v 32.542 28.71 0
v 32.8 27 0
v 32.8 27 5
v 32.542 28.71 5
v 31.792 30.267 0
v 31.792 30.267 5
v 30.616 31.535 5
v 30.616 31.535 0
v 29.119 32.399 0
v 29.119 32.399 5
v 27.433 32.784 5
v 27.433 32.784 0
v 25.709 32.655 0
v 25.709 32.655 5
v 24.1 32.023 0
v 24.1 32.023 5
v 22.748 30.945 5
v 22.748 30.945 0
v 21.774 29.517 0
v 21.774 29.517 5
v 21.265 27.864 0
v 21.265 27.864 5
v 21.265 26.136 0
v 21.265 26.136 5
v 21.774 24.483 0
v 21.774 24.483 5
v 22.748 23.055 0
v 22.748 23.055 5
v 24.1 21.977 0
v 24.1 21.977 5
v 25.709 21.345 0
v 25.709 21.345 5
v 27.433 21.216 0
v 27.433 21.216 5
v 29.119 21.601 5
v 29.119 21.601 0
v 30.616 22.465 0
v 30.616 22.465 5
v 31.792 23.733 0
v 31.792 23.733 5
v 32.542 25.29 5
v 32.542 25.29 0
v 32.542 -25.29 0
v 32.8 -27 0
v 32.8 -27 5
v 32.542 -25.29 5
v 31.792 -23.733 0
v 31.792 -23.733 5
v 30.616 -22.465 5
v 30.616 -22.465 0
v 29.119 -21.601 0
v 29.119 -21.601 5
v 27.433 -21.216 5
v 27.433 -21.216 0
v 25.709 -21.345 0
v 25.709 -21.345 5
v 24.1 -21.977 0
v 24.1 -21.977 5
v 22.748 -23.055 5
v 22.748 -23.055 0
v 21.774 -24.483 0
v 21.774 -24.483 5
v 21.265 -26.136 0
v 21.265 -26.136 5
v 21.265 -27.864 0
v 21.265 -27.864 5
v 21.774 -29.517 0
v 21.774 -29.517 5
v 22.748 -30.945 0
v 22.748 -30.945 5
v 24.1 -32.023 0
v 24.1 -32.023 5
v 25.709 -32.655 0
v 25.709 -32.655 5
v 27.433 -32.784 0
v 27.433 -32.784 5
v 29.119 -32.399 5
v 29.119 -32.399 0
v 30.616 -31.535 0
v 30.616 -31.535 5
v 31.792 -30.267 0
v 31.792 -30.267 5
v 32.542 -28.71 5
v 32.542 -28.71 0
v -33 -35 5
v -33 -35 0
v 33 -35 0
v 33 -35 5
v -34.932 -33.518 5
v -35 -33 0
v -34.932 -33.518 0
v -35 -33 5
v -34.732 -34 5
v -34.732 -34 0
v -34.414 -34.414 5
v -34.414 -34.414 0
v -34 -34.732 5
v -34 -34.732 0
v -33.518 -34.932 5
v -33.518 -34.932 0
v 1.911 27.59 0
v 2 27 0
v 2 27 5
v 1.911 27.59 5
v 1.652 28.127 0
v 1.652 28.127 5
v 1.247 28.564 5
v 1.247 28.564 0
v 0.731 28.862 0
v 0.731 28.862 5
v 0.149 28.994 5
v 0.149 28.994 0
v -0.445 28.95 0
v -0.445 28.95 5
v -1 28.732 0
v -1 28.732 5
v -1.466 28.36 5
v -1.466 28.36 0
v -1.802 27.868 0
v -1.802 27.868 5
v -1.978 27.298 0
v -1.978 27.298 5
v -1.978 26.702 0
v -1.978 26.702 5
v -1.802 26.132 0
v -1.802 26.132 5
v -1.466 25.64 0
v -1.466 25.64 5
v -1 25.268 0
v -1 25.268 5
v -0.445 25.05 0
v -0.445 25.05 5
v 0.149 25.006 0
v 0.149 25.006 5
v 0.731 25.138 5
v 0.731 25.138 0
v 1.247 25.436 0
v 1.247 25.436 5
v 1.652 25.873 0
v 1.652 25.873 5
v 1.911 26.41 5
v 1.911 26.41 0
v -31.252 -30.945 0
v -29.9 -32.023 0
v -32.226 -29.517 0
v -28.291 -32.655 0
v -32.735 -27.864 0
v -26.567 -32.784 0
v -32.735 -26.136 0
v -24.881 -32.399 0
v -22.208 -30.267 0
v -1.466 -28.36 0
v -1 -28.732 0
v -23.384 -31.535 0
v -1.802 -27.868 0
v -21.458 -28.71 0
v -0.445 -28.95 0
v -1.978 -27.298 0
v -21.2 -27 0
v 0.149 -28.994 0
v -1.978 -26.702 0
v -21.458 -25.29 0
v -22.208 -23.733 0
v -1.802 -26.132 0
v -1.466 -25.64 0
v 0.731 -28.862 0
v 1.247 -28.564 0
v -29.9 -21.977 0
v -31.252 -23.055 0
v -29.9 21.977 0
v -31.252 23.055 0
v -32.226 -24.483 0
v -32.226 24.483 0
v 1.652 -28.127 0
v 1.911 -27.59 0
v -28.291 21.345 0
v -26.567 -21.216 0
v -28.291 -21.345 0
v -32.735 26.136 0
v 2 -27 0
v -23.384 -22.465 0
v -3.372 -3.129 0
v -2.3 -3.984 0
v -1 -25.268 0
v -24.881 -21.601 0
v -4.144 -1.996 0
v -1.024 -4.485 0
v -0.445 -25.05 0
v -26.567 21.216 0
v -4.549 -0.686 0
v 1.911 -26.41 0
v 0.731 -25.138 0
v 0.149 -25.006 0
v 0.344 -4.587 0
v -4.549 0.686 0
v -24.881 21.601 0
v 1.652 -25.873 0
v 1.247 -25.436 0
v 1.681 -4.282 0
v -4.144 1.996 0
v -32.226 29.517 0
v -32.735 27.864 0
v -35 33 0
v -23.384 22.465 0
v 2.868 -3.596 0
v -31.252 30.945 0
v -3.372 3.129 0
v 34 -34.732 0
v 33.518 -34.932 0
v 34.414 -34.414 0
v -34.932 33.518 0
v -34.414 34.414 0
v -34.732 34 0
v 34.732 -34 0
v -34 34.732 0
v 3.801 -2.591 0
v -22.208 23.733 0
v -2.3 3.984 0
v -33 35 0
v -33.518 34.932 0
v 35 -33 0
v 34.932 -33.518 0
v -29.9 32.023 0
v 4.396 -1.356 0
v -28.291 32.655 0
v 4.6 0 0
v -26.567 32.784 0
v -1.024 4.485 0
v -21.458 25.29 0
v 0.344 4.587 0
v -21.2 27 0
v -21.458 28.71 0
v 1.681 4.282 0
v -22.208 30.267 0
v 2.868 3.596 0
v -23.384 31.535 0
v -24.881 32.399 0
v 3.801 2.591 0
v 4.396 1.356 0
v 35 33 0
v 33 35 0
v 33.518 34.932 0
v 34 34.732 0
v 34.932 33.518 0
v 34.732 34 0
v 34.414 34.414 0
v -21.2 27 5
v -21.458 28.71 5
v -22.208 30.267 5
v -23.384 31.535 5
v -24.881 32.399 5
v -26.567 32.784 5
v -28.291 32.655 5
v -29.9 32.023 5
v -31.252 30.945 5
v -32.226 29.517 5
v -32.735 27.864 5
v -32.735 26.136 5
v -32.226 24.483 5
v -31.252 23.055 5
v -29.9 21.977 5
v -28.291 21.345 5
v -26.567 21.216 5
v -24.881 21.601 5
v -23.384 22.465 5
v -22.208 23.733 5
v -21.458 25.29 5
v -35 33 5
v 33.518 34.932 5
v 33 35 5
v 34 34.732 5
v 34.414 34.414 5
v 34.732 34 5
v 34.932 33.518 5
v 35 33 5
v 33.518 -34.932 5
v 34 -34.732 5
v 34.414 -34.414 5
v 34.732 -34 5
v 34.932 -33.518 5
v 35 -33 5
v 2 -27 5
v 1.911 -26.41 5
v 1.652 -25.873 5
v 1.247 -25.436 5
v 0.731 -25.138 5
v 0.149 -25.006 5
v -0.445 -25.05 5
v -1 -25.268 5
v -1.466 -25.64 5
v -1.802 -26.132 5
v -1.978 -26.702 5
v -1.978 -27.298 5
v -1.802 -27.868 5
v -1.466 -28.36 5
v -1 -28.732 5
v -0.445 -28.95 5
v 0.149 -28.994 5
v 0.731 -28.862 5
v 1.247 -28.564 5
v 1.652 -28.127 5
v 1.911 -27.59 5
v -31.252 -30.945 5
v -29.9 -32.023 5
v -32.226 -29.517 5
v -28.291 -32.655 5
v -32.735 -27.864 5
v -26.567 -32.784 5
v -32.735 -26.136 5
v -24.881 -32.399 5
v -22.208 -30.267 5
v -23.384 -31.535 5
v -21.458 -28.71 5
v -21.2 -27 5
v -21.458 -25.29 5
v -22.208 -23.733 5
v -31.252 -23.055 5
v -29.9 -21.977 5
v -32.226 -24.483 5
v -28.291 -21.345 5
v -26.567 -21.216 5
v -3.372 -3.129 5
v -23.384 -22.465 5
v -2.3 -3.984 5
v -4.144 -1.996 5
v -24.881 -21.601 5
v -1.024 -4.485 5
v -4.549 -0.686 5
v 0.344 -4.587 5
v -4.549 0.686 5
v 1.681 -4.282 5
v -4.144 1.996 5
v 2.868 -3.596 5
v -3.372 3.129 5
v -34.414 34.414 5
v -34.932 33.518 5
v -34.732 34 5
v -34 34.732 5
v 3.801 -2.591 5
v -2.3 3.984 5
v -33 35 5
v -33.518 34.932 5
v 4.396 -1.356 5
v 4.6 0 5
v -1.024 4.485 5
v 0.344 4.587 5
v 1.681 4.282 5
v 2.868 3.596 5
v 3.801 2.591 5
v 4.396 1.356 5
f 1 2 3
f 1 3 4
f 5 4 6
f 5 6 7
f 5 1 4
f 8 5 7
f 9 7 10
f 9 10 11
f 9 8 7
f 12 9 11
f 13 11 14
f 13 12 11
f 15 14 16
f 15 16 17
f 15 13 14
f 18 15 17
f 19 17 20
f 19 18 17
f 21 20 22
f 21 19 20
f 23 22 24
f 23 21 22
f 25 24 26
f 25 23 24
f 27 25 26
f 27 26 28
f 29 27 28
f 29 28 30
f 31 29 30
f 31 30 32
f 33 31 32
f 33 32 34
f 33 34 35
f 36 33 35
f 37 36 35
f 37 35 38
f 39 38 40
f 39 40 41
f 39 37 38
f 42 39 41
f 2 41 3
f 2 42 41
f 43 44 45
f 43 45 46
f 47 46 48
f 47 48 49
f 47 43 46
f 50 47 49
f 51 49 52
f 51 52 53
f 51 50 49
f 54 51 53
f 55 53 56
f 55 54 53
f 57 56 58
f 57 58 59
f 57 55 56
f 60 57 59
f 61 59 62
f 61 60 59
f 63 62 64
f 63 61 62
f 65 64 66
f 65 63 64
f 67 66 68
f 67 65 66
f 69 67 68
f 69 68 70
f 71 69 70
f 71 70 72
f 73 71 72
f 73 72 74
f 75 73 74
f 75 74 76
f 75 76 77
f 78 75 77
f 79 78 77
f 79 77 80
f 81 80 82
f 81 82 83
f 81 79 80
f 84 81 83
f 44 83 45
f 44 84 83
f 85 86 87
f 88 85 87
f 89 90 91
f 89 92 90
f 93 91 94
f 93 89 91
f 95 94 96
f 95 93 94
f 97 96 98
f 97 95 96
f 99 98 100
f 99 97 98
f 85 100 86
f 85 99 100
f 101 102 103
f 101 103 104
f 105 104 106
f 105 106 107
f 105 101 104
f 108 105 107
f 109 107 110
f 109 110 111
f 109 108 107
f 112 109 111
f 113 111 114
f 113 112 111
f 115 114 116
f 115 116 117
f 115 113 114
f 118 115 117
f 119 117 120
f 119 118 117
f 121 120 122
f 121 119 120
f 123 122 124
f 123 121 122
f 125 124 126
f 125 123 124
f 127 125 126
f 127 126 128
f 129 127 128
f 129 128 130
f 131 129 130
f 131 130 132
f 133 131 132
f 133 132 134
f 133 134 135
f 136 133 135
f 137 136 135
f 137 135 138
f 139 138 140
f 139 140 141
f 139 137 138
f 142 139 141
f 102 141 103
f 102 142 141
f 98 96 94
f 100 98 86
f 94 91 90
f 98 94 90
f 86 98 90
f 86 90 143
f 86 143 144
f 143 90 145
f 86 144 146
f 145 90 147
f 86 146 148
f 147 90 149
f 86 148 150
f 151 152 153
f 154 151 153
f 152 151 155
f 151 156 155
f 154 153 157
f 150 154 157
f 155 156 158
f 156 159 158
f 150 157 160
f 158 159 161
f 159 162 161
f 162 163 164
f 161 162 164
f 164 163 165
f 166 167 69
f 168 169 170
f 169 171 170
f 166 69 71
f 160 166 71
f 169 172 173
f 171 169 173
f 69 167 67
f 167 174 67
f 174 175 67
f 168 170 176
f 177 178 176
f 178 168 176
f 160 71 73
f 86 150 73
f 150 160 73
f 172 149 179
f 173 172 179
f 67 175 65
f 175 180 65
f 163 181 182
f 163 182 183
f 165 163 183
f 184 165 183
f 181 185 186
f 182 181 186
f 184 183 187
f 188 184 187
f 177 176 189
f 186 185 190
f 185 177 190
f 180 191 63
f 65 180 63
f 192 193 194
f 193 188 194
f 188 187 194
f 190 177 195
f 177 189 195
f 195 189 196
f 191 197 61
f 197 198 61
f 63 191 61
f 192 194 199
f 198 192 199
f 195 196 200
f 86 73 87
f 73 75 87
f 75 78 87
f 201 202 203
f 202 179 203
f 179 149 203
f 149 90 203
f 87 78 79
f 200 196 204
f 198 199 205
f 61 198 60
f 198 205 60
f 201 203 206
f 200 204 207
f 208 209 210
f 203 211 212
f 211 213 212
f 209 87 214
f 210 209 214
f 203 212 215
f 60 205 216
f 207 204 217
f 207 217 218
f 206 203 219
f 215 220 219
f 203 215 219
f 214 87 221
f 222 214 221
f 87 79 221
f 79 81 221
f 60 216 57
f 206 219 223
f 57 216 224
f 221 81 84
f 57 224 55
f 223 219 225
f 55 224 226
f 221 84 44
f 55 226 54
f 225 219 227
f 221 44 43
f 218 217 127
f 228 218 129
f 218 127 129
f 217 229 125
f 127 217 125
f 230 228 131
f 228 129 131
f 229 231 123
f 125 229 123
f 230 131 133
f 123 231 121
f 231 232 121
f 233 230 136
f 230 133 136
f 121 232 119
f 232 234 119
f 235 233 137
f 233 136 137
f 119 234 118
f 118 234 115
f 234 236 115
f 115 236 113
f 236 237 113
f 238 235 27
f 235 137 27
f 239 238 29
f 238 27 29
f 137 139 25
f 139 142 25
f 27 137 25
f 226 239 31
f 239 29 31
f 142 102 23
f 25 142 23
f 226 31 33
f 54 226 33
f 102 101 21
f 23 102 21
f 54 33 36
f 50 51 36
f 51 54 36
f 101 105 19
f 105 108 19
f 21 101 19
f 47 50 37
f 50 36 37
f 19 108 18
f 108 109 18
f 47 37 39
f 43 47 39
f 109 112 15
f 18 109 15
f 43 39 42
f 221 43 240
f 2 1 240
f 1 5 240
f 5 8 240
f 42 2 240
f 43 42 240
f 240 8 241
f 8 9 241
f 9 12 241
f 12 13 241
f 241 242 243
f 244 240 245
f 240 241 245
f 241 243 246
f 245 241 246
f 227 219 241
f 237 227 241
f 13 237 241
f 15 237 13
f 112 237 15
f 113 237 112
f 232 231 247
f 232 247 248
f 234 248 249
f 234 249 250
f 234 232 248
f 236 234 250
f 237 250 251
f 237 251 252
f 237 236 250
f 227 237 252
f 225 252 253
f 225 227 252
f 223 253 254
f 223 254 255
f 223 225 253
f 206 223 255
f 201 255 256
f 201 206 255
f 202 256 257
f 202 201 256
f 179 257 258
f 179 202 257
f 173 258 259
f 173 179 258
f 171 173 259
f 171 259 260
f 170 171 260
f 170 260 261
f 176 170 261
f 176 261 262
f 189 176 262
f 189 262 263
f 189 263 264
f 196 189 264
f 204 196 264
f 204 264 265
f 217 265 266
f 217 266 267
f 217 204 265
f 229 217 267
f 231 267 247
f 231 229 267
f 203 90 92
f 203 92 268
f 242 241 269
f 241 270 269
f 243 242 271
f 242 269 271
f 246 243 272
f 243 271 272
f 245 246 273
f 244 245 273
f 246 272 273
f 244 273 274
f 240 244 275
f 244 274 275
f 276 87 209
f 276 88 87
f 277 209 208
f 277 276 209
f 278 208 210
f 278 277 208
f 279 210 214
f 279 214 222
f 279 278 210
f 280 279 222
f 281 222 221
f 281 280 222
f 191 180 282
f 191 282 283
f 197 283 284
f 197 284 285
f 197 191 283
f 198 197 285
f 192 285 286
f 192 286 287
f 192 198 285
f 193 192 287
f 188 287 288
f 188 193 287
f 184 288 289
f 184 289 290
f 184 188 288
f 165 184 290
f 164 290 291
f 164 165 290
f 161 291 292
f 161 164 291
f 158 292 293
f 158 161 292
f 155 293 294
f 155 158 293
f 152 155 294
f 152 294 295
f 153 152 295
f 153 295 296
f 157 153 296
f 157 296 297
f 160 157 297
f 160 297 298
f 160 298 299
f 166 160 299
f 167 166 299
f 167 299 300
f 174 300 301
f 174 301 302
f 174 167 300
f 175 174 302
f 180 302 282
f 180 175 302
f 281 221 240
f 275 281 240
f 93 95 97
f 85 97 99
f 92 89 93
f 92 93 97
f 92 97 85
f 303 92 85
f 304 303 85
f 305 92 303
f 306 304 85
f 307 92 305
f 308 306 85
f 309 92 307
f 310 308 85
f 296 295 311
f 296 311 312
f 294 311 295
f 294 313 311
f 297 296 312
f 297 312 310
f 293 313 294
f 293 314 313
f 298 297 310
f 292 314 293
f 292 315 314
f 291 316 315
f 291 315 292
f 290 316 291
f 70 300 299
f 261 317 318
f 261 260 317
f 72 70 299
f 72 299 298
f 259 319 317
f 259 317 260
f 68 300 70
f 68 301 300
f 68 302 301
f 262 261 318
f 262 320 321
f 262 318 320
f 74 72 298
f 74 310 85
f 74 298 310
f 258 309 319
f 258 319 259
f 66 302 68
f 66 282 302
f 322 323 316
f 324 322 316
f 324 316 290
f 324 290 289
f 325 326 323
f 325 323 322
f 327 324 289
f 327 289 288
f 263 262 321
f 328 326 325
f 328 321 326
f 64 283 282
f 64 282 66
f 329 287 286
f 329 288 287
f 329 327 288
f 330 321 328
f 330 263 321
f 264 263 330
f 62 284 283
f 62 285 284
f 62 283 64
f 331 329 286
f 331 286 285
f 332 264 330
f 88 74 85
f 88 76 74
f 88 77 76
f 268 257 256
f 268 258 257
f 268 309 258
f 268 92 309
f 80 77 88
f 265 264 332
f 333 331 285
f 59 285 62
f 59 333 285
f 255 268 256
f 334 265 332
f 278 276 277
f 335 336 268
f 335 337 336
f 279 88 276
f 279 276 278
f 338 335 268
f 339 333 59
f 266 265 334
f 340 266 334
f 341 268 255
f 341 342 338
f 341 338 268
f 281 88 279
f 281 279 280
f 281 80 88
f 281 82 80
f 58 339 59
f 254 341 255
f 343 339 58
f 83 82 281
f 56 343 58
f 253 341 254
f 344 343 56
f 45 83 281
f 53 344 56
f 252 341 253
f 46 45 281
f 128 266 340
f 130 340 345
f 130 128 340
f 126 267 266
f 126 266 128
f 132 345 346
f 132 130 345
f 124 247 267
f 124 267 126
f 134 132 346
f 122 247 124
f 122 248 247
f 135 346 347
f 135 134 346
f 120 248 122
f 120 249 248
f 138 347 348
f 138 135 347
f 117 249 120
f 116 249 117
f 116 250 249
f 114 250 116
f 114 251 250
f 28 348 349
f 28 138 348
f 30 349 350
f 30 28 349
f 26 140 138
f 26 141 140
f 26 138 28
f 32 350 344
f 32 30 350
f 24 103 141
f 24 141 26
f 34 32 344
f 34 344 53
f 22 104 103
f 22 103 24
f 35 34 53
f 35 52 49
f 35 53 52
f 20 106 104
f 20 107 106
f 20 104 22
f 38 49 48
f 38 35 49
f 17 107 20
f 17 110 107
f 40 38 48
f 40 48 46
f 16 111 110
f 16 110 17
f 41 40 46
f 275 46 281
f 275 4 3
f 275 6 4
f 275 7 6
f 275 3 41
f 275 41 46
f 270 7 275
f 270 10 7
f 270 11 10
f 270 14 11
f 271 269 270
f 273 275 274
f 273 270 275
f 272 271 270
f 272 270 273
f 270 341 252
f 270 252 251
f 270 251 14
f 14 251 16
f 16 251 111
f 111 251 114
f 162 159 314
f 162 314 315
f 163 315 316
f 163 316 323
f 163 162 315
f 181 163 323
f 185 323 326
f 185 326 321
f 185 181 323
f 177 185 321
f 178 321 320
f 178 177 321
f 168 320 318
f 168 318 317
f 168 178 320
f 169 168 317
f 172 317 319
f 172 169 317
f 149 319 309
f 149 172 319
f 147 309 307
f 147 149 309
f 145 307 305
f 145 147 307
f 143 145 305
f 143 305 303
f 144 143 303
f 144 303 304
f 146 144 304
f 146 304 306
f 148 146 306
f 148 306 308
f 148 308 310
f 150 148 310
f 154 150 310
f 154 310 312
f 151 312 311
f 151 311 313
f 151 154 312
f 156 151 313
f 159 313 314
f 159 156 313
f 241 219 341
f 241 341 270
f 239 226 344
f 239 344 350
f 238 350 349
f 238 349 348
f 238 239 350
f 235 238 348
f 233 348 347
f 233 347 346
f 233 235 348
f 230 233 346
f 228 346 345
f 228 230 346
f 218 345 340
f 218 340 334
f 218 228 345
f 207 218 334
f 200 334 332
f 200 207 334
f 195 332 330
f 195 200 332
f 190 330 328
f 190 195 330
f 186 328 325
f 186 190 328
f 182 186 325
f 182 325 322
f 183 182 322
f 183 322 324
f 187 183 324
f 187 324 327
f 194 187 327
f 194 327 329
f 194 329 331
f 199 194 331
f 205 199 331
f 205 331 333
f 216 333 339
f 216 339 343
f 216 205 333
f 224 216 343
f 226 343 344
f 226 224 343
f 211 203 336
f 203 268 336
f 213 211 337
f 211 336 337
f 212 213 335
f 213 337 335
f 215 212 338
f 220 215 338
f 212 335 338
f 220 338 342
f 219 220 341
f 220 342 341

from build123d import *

# Parameters (mm, degrees)
SKETCH1_W           = 70
SKETCH1_H           = 70
SKETCH1_R           = 5.8
SKETCH1_R_2         = 4.6
SKETCH1_R_3         = 2
BOSS_EXTRUDE1_DEPTH = 5
FILLET1_R           = 2
FILLET2_R           = 2


with BuildPart() as part:
    # Sketch1 → Boss-Extrude1 (new body)
    with BuildSketch(Plane.XY):
        Rectangle(SKETCH1_W, SKETCH1_H)
        with Locations((-27, 27)):
            Circle(SKETCH1_R, mode=Mode.SUBTRACT)
        with Locations((27, 27)):
            Circle(SKETCH1_R, mode=Mode.SUBTRACT)
        with Locations((27, -27)):
            Circle(SKETCH1_R, mode=Mode.SUBTRACT)
        with Locations((-27, -27)):
            Circle(SKETCH1_R, mode=Mode.SUBTRACT)
        Circle(SKETCH1_R_2, mode=Mode.SUBTRACT)
        with Locations((0, 27)):
            Circle(SKETCH1_R_3, mode=Mode.SUBTRACT)
        with Locations((0, -27)):
            Circle(SKETCH1_R_3, mode=Mode.SUBTRACT)
    extrude(amount=BOSS_EXTRUDE1_DEPTH)

    # Fillet1
    fillet1_edges = [part.edges().sort_by_distance(p)[0] for p in [
        (-35, 35, 2.5),
        (35, 35, 2.5),
        (35, -35, 2.5),
    ]]
    fillet(fillet1_edges, radius=FILLET1_R)

    # Fillet2
    fillet2_edges = [part.edges().sort_by_distance(p)[0] for p in [
        (-35, -35, 2.5),
    ]]
    fillet(fillet2_edges, radius=FILLET2_R)


solid = part.part
